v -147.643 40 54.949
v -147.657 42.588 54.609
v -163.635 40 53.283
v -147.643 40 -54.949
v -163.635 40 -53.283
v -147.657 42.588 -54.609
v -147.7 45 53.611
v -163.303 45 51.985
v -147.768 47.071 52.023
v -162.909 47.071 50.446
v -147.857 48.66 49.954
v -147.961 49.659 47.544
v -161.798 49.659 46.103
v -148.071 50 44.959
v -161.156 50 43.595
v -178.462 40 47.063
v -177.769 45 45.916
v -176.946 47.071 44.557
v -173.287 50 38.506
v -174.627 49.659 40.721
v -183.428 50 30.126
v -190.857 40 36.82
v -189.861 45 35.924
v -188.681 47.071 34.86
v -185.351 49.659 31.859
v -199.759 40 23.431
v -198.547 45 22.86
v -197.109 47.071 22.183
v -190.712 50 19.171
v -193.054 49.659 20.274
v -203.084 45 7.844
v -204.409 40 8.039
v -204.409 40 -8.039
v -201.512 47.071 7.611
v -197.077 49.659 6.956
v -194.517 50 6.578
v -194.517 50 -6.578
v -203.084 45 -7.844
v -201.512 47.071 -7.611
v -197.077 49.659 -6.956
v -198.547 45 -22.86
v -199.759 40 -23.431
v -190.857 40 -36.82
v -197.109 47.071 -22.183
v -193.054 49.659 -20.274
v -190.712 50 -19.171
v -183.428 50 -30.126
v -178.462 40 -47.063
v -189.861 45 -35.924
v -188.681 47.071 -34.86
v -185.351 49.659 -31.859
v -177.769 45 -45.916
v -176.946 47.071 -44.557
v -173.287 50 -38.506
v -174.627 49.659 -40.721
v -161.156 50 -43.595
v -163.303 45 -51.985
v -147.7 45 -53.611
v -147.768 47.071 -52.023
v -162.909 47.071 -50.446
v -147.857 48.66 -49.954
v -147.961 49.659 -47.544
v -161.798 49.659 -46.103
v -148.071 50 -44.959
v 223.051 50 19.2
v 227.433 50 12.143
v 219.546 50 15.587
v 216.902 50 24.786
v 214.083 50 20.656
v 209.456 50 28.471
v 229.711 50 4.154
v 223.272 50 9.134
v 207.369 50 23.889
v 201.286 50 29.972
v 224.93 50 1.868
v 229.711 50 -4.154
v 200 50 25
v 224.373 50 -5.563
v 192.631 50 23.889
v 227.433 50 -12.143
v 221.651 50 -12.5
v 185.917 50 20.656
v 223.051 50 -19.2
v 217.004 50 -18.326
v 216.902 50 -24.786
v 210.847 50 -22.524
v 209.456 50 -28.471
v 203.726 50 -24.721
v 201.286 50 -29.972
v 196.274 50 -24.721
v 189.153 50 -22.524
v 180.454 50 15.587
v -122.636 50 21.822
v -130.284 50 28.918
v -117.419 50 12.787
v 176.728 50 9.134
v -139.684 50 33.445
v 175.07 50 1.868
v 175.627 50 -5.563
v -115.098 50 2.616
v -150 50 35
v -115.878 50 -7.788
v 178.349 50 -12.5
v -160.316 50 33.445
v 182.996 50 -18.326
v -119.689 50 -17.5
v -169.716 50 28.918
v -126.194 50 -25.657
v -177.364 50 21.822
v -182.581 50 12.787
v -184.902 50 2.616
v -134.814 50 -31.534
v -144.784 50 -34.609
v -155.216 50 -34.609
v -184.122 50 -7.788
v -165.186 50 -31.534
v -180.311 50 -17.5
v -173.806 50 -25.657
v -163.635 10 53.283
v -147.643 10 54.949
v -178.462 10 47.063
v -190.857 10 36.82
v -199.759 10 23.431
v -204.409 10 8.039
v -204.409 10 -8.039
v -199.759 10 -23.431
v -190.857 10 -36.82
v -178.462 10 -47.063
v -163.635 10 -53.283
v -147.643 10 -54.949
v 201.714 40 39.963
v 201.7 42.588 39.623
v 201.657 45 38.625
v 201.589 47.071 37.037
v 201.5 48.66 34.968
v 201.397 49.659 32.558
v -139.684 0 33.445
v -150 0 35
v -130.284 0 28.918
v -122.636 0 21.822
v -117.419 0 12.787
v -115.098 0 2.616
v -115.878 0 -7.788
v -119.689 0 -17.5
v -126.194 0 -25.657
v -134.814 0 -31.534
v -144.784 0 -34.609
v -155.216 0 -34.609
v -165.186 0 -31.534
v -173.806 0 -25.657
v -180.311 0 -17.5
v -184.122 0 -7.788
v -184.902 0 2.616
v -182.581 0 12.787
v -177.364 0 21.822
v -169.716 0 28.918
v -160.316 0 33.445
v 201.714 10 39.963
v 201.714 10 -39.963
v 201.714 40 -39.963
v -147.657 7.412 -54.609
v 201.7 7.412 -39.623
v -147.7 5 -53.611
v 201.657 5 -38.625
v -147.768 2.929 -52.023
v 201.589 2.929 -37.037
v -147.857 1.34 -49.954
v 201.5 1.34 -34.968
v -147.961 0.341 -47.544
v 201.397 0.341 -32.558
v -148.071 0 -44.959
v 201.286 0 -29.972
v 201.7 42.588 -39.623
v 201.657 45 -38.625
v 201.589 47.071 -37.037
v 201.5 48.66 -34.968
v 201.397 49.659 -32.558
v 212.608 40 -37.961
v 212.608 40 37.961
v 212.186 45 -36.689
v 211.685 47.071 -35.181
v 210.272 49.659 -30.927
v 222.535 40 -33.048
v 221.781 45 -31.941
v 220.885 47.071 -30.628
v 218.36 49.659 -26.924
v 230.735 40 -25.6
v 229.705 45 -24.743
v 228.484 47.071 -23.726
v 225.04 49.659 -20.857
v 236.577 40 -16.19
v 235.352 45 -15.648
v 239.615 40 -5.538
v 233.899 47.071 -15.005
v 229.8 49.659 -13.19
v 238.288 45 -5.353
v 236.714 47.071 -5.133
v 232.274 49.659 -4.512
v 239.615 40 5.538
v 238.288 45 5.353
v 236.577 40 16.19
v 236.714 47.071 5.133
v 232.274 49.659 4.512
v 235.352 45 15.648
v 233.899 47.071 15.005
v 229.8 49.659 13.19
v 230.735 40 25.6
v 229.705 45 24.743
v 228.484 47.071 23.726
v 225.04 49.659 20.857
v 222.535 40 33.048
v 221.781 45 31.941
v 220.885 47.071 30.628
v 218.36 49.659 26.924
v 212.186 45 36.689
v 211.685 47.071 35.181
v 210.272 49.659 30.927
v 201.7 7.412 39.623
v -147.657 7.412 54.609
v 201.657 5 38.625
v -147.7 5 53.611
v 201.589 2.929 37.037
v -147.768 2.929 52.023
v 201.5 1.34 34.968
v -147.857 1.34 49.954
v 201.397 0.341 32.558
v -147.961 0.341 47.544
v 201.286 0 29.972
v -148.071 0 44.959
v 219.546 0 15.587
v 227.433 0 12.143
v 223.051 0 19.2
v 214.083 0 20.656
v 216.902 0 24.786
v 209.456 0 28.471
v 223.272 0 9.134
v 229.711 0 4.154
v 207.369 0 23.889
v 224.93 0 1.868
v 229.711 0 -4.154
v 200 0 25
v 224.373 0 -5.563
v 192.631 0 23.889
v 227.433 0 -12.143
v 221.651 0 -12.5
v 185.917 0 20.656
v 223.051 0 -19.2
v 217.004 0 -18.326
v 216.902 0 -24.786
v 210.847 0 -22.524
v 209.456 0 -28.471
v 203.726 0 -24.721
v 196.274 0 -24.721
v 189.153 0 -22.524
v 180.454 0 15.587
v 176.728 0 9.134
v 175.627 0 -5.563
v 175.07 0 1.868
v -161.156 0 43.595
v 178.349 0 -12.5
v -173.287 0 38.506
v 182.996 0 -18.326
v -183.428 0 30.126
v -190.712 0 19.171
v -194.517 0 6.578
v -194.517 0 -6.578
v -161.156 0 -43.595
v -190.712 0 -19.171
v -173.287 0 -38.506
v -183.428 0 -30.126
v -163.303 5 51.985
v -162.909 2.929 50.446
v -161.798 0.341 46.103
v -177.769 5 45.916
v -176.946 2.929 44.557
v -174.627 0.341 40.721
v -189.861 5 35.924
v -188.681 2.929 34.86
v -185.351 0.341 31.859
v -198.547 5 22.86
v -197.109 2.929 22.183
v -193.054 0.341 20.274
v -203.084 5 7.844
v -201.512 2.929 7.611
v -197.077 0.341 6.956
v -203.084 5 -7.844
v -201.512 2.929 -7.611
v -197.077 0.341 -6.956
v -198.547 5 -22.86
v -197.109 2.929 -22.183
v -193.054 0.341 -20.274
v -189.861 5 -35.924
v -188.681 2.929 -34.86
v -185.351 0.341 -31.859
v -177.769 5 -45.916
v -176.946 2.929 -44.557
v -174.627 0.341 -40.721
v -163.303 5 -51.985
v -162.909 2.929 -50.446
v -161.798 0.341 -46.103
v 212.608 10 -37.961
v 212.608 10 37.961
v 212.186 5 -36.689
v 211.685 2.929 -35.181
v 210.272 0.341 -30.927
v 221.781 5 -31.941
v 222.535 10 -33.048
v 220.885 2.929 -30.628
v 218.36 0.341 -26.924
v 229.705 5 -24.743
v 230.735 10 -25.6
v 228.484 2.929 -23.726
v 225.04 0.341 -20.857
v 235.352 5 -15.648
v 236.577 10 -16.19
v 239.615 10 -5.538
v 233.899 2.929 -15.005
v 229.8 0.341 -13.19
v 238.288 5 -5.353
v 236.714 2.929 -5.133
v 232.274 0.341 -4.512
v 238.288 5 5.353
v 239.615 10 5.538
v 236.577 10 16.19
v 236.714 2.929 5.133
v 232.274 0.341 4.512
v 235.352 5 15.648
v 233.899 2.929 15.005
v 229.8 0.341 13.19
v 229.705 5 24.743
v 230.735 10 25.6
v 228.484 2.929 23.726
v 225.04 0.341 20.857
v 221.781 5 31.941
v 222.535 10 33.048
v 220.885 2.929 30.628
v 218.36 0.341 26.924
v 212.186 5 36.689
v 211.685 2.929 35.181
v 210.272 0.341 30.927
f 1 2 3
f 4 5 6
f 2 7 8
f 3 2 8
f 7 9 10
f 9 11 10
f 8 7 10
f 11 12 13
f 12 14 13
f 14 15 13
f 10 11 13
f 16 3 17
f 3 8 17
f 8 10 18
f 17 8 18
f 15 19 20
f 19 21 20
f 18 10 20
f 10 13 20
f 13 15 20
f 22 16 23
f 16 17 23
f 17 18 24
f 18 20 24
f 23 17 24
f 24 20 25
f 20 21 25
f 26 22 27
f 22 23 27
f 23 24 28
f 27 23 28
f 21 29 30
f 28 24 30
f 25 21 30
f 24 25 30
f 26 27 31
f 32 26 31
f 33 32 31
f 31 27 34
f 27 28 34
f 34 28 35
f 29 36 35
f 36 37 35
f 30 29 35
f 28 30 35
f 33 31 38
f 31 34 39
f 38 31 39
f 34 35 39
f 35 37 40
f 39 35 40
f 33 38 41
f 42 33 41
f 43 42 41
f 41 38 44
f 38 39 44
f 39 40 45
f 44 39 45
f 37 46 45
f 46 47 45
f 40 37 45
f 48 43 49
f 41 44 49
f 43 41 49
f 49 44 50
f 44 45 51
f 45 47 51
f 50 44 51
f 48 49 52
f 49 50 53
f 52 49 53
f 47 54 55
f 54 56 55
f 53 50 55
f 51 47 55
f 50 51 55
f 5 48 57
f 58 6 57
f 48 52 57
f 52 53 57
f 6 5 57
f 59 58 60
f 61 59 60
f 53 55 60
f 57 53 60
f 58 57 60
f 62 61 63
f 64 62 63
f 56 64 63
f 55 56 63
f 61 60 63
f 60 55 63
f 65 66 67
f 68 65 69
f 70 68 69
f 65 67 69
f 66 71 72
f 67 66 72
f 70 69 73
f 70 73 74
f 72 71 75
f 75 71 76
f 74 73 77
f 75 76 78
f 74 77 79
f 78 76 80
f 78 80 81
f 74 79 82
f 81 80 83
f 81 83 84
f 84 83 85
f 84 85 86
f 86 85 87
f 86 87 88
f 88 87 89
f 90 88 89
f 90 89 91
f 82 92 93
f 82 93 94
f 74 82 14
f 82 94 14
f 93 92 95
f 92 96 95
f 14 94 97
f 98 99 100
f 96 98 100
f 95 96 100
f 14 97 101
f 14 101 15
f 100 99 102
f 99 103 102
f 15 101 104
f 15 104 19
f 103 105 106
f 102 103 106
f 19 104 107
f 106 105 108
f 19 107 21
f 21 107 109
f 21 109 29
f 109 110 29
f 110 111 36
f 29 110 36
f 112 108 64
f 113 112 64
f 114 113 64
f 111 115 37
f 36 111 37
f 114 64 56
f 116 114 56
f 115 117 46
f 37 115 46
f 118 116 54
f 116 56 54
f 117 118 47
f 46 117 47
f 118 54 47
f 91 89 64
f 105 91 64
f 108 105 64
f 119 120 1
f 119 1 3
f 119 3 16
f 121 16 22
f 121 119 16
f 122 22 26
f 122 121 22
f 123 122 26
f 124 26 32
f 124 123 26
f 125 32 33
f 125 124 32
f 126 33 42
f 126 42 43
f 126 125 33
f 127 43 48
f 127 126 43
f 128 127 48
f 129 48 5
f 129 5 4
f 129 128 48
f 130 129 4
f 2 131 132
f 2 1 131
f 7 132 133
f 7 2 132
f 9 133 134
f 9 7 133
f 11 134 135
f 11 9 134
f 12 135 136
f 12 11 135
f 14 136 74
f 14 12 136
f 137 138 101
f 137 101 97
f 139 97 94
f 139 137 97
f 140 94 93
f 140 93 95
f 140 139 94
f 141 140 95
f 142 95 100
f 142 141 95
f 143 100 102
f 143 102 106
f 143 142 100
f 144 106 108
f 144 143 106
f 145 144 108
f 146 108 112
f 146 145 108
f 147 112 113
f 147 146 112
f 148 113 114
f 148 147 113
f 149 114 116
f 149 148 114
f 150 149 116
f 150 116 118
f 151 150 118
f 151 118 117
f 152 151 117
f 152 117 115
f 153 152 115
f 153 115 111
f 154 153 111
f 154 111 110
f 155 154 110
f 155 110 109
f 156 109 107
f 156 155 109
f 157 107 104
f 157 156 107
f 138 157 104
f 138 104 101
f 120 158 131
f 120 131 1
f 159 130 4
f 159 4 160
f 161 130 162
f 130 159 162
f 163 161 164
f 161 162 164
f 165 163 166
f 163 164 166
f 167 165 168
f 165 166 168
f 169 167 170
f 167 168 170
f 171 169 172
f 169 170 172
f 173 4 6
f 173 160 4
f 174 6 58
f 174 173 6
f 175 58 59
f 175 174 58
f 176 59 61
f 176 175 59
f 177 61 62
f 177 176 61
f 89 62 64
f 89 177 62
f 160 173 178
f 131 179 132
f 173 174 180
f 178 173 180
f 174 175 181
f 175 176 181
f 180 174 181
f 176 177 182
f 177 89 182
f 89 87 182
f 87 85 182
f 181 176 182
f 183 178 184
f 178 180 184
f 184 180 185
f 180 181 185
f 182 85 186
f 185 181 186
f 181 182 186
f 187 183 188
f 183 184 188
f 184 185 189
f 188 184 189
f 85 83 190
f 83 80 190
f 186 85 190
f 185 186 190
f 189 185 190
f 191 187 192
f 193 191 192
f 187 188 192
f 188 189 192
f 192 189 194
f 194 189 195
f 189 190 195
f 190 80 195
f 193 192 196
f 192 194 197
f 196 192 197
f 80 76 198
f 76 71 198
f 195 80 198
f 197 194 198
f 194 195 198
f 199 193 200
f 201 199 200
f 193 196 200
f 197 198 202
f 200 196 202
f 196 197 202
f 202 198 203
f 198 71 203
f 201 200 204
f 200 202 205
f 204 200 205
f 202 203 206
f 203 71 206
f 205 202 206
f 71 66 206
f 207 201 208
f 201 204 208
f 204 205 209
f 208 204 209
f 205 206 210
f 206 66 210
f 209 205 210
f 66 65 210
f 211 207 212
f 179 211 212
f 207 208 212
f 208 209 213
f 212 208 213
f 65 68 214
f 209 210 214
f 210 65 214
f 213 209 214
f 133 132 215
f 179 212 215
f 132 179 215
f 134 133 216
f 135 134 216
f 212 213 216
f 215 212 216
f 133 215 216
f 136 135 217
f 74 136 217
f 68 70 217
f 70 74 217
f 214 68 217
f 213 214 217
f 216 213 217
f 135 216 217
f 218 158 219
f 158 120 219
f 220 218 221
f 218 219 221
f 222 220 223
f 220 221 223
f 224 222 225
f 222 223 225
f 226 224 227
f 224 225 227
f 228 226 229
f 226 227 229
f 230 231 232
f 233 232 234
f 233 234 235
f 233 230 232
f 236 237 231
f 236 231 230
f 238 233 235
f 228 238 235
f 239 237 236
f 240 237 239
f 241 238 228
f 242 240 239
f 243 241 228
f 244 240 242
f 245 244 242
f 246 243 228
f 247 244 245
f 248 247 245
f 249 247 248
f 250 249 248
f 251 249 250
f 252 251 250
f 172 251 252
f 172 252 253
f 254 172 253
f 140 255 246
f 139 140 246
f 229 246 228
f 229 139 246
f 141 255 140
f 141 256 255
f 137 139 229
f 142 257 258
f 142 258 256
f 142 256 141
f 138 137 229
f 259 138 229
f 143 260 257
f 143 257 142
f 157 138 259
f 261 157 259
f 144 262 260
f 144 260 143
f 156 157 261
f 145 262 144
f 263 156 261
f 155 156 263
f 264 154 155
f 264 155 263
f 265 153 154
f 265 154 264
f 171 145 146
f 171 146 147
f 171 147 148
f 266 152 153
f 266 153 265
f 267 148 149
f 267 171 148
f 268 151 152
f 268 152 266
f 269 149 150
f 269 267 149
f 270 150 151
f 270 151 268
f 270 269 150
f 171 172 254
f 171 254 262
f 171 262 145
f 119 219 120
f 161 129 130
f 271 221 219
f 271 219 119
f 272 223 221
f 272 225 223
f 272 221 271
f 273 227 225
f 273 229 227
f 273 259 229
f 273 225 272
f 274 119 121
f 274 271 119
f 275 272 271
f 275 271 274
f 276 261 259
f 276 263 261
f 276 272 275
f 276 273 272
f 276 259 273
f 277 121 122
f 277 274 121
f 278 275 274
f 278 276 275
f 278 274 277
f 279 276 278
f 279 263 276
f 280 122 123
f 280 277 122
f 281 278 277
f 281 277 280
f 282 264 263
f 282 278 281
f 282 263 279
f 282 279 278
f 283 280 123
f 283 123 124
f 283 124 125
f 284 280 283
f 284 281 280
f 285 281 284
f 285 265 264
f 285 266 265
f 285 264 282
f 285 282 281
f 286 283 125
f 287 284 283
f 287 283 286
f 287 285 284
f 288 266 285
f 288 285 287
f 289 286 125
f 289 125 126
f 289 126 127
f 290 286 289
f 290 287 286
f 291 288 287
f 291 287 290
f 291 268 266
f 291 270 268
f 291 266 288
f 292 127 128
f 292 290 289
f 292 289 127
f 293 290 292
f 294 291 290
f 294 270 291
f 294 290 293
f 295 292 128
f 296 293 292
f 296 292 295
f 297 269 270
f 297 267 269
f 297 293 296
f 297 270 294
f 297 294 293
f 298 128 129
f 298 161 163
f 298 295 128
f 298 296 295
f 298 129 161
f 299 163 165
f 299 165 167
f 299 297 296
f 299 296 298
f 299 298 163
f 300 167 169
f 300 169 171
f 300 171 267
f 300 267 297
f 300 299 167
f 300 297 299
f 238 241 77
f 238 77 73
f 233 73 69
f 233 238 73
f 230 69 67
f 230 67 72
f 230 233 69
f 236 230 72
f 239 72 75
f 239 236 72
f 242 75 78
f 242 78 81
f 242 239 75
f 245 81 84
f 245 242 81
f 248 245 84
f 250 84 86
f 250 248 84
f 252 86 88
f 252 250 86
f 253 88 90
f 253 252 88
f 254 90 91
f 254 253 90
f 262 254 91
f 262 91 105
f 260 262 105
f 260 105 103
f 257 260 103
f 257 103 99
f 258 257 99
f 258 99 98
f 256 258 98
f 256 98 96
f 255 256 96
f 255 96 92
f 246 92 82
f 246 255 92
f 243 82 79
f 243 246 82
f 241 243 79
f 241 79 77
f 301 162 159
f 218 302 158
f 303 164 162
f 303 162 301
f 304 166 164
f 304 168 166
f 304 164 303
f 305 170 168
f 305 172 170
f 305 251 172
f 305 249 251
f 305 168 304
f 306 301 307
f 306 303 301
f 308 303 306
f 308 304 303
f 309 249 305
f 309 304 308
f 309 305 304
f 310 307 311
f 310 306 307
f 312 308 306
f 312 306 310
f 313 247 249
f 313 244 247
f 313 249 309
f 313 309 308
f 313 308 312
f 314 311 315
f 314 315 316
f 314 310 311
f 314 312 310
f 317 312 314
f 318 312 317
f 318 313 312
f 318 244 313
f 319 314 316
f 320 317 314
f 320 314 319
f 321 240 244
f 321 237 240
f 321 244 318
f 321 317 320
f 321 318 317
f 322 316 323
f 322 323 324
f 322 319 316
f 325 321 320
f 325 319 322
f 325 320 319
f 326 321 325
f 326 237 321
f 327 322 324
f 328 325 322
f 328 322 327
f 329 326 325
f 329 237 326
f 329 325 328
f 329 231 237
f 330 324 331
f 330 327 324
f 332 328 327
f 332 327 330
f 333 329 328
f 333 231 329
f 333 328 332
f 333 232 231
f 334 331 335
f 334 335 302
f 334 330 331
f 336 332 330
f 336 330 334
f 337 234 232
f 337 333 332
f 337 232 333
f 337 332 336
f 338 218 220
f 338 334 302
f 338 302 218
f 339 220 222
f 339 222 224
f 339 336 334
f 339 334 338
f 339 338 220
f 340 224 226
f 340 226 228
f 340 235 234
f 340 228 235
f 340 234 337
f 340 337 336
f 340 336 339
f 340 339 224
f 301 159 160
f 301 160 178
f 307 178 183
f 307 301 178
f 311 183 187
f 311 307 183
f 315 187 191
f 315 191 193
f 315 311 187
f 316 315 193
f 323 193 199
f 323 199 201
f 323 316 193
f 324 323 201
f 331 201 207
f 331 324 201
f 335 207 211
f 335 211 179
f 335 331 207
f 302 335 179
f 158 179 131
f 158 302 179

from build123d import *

# Parameters (mm, degrees)
CROQUIS1_R              = 35
CROQUIS1_R_2            = 25
SALIENTE_EXTRUIR1_DEPTH = 50
REDONDEO1_R             = 10


with BuildPart() as part:
    # Croquis1 → Saliente-Extruir1 (new body)
    with BuildSketch(Plane(origin=(0, 0, 0), x_dir=(1, 0, 0), z_dir=(0, 1, 0))):
        with BuildLine():
            Line((-147.642857143, 54.949466581), (201.714285714, 39.963248423))
            ThreePointArc((201.714285714, 39.963248423), (240, 0), (201.714285714, -39.963248423))
            Line((201.714285714, -39.963248423), (-147.642857143, -54.949466581))
            ThreePointArc((-147.642857143, -54.949466581), (-205, 0), (-147.642857143, 54.949466581))
        make_face()
        with Locations(Location((-150, 0, 0), (0, 0, 270))):
            Circle(CROQUIS1_R, mode=Mode.SUBTRACT)
        with Locations(Location((200, 0, 0), (0, 0, 270))):
            Circle(CROQUIS1_R_2, mode=Mode.SUBTRACT)
    extrude(amount=SALIENTE_EXTRUIR1_DEPTH)

    # Redondeo1
    redondeo1_edges = [part.edges().sort_by_distance(p)[0] for p in [
        (240, 50, 0),
        (27.035714286, 50, -47.456357502),
        (-205, 50, 0),
        (27.035714286, 0, -47.456357502),
        (240, 0, 0),
        (27.035714286, 0, 47.456357502),
        (-205, 0, 0),
        (27.035714286, 50, 47.456357502),
    ]]
    fillet(redondeo1_edges, radius=REDONDEO1_R)


solid = part.part
